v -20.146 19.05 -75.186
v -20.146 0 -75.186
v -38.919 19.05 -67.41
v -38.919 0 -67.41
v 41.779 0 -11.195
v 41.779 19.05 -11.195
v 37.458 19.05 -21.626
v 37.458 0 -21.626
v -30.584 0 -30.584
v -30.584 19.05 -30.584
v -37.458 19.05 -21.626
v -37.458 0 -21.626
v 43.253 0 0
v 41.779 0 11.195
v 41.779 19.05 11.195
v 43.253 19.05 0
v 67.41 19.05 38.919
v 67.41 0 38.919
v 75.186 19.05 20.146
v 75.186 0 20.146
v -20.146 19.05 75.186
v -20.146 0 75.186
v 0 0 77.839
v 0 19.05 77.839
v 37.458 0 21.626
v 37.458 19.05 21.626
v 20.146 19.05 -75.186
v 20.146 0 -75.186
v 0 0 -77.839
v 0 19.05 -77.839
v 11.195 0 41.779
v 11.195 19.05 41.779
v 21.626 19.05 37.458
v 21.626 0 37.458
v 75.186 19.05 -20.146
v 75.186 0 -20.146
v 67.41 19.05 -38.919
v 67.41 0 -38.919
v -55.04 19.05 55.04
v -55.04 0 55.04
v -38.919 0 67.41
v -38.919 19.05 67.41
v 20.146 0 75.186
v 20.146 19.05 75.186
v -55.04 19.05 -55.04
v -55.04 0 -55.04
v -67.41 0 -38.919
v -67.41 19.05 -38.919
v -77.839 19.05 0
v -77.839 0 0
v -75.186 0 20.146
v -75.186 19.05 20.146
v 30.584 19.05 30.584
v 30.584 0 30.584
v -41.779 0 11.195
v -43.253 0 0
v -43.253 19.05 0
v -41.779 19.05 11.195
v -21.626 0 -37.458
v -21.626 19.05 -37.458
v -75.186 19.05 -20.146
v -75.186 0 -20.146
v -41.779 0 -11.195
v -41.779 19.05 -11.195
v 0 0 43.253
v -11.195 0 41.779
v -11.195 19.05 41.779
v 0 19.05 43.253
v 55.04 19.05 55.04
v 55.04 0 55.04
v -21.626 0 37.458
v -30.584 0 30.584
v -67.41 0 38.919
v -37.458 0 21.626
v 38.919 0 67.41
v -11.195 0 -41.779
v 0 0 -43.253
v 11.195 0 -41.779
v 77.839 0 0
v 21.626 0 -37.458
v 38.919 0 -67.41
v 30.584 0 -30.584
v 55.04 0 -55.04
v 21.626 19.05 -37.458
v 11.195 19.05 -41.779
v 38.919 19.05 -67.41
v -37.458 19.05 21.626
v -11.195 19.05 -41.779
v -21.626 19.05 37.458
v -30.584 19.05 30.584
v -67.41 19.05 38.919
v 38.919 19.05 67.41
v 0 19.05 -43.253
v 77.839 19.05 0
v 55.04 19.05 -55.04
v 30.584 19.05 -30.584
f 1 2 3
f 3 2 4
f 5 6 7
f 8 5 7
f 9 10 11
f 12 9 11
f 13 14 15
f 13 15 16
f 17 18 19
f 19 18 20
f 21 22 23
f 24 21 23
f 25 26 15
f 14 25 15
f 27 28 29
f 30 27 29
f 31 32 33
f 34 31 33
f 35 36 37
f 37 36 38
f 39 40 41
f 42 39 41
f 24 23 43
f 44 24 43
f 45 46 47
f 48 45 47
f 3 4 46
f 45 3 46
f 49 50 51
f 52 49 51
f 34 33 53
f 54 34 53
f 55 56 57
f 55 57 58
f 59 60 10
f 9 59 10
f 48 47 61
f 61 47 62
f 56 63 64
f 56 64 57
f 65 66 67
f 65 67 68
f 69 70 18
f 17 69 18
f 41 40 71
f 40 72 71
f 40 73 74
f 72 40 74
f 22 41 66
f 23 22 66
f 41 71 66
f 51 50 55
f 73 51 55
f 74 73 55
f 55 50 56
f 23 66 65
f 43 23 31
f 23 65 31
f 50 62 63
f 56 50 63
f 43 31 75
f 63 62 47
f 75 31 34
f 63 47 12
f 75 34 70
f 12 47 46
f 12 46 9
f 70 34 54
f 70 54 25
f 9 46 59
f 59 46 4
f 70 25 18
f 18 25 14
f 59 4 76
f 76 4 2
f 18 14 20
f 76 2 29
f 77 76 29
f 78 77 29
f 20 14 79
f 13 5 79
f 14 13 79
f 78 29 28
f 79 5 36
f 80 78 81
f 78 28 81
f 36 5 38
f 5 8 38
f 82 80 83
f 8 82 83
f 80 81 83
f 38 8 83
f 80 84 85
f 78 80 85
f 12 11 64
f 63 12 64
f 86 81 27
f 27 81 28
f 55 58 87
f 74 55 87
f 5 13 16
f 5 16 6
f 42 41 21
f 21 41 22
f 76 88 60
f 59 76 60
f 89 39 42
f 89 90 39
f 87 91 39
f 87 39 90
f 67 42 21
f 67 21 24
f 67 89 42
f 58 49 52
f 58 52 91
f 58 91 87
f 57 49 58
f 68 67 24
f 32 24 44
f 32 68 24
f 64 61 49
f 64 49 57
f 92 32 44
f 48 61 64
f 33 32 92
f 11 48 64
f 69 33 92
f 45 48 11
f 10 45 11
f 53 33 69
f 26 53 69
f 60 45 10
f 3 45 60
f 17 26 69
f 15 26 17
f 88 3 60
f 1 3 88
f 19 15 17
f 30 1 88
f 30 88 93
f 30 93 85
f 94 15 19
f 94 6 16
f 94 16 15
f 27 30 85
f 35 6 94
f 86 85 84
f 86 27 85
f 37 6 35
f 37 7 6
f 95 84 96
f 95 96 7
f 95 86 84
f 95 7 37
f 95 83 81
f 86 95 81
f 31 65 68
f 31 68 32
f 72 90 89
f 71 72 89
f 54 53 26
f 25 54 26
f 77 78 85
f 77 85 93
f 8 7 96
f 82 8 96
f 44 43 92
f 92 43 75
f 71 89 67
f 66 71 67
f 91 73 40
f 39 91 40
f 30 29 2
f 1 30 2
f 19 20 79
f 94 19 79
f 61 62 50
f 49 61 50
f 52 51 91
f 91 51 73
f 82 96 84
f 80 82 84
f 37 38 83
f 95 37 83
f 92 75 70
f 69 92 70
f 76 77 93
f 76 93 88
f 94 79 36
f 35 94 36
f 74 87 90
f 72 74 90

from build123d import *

# Parameters (mm, degrees)
BOSS_EXTRUDE3_DEPTH = 19.05


with BuildPart() as part:
    # Sketch3 → Boss-Extrude3 (new body)
    with BuildSketch(Plane(origin=(0, 0, 0), x_dir=(1, 0, 0), z_dir=(0, 1, 0))):
        Polygon((-77.838783367, 0), (-75.186491142, -20.146159583), (-67.410363796, -38.919391684), (-55.040331558, -55.040331558), (-38.919391684, -67.410363796), (-20.146159583, -75.186491142), (0, -77.838783367), (20.146159583, -75.186491142), (38.919391684, -67.410363796), (55.040331558, -55.040331558), (67.410363796, -38.919391684), (75.186491142, -20.146159583), (77.838783367, 0), (75.186491142, 20.146159583), (67.410363796, 38.919391684), (55.040331558, 55.040331558), (38.919391684, 67.410363796), (20.146159583, 75.186491142), (0, 77.838783367), (-20.146159583, 75.186491142), (-38.919391684, 67.410363796), (-55.040331558, 55.040331558), (-67.410363796, 38.919391684), (-75.186491142, 20.146159583), align=None)
        Polygon((-43.252896309, 0), (-41.779089607, -11.194673321), (-37.458106991, -21.626448155), (-30.584416286, -30.584416286), (-21.626448155, -37.458106991), (-11.194673321, -41.779089607), (0, -43.252896309), (11.194673321, -41.779089607), (21.626448155, -37.458106991), (30.584416286, -30.584416286), (37.458106991, -21.626448155), (41.779089607, -11.194673321), (43.252896309, 0), (41.779089607, 11.194673321), (37.458106991, 21.626448155), (30.584416286, 30.584416286), (21.626448155, 37.458106991), (11.194673321, 41.779089607), (0, 43.252896309), (-11.194673321, 41.779089607), (-21.626448155, 37.458106991), (-30.584416286, 30.584416286), (-37.458106991, 21.626448155), (-41.779089607, 11.194673321), align=None, mode=Mode.SUBTRACT)
    extrude(amount=BOSS_EXTRUDE3_DEPTH)


solid = part.part
